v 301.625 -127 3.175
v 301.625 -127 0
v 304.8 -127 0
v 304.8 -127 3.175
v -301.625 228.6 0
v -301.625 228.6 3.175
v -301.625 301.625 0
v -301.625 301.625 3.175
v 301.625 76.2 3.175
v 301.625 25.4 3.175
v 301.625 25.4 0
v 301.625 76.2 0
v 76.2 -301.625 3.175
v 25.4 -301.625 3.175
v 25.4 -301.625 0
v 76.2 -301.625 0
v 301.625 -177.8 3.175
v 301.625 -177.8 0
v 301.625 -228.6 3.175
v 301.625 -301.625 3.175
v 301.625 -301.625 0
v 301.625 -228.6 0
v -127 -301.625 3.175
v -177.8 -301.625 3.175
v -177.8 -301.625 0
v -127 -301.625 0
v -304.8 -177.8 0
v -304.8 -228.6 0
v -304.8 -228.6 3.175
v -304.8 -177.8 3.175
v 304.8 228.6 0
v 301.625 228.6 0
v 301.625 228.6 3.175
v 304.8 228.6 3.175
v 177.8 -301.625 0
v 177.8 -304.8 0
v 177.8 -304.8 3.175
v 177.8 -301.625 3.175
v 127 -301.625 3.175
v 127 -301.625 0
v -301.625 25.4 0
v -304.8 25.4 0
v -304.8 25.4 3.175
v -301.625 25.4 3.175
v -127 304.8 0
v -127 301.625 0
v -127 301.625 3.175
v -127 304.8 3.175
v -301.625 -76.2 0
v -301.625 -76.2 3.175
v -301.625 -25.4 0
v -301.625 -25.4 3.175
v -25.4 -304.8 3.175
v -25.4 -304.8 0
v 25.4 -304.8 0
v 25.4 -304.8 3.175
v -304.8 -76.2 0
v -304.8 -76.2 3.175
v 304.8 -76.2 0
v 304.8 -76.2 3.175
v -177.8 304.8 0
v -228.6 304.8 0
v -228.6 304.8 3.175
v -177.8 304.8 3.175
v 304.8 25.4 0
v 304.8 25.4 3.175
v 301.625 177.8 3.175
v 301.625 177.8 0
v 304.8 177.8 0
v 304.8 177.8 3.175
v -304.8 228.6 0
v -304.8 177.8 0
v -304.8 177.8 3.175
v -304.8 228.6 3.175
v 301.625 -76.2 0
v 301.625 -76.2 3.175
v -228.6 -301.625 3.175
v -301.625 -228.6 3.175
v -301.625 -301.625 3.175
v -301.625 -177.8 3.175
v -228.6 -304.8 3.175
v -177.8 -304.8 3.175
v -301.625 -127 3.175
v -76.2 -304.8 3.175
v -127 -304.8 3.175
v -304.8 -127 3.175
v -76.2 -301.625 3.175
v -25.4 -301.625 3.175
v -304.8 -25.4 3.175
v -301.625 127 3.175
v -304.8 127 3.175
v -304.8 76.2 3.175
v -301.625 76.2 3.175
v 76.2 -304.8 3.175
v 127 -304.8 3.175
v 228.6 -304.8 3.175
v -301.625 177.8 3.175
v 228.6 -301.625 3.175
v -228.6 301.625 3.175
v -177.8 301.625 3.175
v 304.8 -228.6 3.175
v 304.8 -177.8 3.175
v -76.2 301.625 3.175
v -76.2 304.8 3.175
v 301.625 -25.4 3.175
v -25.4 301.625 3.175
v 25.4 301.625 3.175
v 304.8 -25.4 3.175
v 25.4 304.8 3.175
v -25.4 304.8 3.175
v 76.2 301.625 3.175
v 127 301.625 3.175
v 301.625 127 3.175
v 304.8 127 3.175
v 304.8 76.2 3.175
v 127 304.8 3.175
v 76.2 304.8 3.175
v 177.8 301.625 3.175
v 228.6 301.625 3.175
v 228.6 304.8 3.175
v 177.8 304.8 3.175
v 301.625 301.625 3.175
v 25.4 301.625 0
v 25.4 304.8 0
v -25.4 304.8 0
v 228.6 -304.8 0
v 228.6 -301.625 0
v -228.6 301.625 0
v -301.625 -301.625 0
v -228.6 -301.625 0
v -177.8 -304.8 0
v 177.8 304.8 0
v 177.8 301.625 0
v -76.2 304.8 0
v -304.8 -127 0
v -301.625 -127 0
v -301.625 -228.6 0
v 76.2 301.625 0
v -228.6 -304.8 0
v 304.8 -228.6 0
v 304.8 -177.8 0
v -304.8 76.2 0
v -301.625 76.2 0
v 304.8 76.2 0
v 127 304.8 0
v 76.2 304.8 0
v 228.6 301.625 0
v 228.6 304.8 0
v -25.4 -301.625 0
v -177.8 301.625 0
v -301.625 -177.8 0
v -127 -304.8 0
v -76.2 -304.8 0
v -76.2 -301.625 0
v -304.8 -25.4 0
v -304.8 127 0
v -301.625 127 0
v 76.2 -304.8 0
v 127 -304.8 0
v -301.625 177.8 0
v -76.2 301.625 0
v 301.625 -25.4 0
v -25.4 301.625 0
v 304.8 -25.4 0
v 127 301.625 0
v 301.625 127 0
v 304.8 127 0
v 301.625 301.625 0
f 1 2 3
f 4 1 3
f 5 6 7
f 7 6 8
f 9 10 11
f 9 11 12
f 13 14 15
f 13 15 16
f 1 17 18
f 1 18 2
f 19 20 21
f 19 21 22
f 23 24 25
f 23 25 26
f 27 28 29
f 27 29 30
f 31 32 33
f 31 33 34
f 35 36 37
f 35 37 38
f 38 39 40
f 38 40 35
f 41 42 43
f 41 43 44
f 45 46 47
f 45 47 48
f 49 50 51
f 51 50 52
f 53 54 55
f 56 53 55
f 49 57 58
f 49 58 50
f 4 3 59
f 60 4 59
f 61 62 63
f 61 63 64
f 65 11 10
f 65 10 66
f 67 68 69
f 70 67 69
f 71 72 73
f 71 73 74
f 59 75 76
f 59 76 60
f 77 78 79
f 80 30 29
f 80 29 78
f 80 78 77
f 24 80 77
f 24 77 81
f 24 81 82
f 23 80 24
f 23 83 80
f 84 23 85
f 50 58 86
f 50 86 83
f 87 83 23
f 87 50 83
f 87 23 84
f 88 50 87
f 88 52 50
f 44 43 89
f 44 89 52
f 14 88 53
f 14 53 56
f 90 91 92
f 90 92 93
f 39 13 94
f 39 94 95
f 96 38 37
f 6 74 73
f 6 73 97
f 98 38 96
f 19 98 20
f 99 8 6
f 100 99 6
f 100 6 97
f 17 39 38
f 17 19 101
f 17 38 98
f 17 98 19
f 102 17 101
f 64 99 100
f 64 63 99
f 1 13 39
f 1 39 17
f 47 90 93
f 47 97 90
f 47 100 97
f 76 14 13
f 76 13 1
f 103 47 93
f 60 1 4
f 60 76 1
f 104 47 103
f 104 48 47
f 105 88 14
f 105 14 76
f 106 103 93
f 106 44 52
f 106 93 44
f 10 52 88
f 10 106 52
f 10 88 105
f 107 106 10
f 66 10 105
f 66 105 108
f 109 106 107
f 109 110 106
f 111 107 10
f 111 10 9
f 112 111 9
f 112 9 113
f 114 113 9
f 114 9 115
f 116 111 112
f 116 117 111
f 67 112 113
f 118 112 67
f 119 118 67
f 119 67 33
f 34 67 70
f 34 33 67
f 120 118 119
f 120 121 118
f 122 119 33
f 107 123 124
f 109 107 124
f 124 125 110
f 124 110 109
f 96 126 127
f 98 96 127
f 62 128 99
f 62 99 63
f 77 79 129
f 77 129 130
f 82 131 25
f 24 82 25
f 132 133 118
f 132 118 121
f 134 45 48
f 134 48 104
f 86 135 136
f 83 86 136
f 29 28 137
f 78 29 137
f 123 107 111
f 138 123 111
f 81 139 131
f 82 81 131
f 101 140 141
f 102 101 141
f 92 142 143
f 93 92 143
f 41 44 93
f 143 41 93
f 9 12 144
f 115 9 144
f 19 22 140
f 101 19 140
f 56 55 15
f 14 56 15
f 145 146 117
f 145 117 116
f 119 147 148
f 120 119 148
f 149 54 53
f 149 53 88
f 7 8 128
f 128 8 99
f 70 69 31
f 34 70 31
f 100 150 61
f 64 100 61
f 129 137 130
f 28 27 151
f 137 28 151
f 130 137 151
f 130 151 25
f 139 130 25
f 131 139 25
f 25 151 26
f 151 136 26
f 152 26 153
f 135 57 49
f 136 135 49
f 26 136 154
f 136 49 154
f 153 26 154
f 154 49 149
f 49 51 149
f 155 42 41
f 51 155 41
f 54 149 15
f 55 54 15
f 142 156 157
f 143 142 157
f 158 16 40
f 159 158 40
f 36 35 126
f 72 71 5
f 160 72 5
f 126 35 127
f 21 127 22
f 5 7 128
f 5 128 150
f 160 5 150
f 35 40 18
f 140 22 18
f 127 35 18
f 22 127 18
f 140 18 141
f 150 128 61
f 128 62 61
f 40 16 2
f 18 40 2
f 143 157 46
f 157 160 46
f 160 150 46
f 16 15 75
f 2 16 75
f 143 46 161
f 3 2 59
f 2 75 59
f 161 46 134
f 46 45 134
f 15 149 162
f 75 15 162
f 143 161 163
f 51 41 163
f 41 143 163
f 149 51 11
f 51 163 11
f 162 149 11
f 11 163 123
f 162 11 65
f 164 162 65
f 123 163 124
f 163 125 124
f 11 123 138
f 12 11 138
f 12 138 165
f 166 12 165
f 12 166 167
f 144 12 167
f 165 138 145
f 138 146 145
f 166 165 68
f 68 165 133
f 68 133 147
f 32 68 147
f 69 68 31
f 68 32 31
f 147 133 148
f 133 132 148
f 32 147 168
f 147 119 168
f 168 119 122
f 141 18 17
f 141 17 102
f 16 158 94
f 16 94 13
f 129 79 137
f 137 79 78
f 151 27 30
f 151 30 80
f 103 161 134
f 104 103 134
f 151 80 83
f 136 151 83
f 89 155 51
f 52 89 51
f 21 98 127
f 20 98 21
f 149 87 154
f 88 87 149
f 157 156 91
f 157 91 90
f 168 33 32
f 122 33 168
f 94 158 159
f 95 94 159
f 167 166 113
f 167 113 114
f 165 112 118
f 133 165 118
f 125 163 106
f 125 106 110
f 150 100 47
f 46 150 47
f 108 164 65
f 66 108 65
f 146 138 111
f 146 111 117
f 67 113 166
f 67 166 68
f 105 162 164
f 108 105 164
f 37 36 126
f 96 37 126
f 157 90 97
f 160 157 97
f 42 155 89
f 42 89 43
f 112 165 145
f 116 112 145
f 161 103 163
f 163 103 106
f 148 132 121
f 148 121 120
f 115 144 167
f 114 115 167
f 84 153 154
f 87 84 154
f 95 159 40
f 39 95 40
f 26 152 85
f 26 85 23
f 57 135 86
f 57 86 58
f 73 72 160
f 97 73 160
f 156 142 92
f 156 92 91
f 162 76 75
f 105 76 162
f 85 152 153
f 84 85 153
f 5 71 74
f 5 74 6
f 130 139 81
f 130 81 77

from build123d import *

# Parameters (mm, degrees)
F0_W     = 609.6
F0_H     = 609.6
F1_DEPTH = 3.175
F2_W     = 76.2
F2_H     = 3.175
F2_W_2   = 3.175
F2_H_2   = 76.2
F3_DEPTH = 25.4
F4_W     = 3.175
F4_H     = 73.025
F4_W_2   = 73.025
F4_H_2   = 3.175
F5_DEPTH = 25.4
F6_W     = 50.8
F6_H     = 3.175
F6_W_2   = 3.175
F6_H_2   = 50.8
F7_DEPTH = 25.4


with BuildPart() as f1:
    # F0 (on Top) → F1 (new body)
    with BuildSketch(Plane.XY):
        Rectangle(F0_W, F0_H)
    extrude(amount=F1_DEPTH)

    # F2 (on face) → F3 (cut)
    with BuildSketch(Plane.XY.offset(3.175)):
        with Locations((-266.7, -303.2125)):
            Rectangle(F2_W, F2_H)
        with Locations((303.2125, -266.7)):
            Rectangle(F2_W_2, F2_H_2)
        with Locations((266.7, 303.2125)):
            Rectangle(F2_W, F2_H)
        with Locations((-303.2125, 266.7)):
            Rectangle(F2_W_2, F2_H_2)
    extrude(amount=-F3_DEPTH, mode=Mode.SUBTRACT)

    # F4 (on face) → F5 (cut)
    with BuildSketch(Plane.XY.offset(3.175)):
        with Locations((-303.2125, -265.1125)):
            Rectangle(F4_W, F4_H)
        with Locations((265.1125, -303.2125)):
            Rectangle(F4_W_2, F4_H_2)
        with Locations((303.2125, 265.1125)):
            Rectangle(F4_W, F4_H)
        with Locations((-265.1125, 303.2125)):
            Rectangle(F4_W_2, F4_H_2)
    extrude(amount=-F5_DEPTH, mode=Mode.SUBTRACT)

    # F6 (on face) → F7 (cut)
    with BuildSketch(Plane.XY.offset(3.175)):
        with Locations((-152.4, -303.2125)):
            Rectangle(F6_W, F6_H)
        with Locations((-50.8, -303.2125)):
            Rectangle(F6_W, F6_H)
        with Locations((50.8, -303.2125)):
            Rectangle(F6_W, F6_H)
        with Locations((152.4, -303.2125)):
            Rectangle(F6_W, F6_H)
        with Locations((303.2125, -50.8)):
            Rectangle(F6_W_2, F6_H_2)
        with Locations((303.2125, 50.8)):
            Rectangle(F6_W_2, F6_H_2)
        with Locations((303.2125, 152.4)):
            Rectangle(F6_W_2, F6_H_2)
        with Locations((303.2125, -152.4)):
            Rectangle(F6_W_2, F6_H_2)
        with Locations((50.8, 303.2125)):
            Rectangle(F6_W, F6_H)
        with Locations((-50.8, 303.2125)):
            Rectangle(F6_W, F6_H)
        with Locations((-152.4, 303.2125)):
            Rectangle(F6_W, F6_H)
        with Locations((152.4, 303.2125)):
            Rectangle(F6_W, F6_H)
        with Locations((-303.2125, 50.8)):
            Rectangle(F6_W_2, F6_H_2)
        with Locations((-303.2125, -50.8)):
            Rectangle(F6_W_2, F6_H_2)
        with Locations((-303.2125, -152.4)):
            Rectangle(F6_W_2, F6_H_2)
        with Locations((-303.2125, 152.4)):
            Rectangle(F6_W_2, F6_H_2)
    extrude(amount=-F7_DEPTH, mode=Mode.SUBTRACT)


solid = f1.part
